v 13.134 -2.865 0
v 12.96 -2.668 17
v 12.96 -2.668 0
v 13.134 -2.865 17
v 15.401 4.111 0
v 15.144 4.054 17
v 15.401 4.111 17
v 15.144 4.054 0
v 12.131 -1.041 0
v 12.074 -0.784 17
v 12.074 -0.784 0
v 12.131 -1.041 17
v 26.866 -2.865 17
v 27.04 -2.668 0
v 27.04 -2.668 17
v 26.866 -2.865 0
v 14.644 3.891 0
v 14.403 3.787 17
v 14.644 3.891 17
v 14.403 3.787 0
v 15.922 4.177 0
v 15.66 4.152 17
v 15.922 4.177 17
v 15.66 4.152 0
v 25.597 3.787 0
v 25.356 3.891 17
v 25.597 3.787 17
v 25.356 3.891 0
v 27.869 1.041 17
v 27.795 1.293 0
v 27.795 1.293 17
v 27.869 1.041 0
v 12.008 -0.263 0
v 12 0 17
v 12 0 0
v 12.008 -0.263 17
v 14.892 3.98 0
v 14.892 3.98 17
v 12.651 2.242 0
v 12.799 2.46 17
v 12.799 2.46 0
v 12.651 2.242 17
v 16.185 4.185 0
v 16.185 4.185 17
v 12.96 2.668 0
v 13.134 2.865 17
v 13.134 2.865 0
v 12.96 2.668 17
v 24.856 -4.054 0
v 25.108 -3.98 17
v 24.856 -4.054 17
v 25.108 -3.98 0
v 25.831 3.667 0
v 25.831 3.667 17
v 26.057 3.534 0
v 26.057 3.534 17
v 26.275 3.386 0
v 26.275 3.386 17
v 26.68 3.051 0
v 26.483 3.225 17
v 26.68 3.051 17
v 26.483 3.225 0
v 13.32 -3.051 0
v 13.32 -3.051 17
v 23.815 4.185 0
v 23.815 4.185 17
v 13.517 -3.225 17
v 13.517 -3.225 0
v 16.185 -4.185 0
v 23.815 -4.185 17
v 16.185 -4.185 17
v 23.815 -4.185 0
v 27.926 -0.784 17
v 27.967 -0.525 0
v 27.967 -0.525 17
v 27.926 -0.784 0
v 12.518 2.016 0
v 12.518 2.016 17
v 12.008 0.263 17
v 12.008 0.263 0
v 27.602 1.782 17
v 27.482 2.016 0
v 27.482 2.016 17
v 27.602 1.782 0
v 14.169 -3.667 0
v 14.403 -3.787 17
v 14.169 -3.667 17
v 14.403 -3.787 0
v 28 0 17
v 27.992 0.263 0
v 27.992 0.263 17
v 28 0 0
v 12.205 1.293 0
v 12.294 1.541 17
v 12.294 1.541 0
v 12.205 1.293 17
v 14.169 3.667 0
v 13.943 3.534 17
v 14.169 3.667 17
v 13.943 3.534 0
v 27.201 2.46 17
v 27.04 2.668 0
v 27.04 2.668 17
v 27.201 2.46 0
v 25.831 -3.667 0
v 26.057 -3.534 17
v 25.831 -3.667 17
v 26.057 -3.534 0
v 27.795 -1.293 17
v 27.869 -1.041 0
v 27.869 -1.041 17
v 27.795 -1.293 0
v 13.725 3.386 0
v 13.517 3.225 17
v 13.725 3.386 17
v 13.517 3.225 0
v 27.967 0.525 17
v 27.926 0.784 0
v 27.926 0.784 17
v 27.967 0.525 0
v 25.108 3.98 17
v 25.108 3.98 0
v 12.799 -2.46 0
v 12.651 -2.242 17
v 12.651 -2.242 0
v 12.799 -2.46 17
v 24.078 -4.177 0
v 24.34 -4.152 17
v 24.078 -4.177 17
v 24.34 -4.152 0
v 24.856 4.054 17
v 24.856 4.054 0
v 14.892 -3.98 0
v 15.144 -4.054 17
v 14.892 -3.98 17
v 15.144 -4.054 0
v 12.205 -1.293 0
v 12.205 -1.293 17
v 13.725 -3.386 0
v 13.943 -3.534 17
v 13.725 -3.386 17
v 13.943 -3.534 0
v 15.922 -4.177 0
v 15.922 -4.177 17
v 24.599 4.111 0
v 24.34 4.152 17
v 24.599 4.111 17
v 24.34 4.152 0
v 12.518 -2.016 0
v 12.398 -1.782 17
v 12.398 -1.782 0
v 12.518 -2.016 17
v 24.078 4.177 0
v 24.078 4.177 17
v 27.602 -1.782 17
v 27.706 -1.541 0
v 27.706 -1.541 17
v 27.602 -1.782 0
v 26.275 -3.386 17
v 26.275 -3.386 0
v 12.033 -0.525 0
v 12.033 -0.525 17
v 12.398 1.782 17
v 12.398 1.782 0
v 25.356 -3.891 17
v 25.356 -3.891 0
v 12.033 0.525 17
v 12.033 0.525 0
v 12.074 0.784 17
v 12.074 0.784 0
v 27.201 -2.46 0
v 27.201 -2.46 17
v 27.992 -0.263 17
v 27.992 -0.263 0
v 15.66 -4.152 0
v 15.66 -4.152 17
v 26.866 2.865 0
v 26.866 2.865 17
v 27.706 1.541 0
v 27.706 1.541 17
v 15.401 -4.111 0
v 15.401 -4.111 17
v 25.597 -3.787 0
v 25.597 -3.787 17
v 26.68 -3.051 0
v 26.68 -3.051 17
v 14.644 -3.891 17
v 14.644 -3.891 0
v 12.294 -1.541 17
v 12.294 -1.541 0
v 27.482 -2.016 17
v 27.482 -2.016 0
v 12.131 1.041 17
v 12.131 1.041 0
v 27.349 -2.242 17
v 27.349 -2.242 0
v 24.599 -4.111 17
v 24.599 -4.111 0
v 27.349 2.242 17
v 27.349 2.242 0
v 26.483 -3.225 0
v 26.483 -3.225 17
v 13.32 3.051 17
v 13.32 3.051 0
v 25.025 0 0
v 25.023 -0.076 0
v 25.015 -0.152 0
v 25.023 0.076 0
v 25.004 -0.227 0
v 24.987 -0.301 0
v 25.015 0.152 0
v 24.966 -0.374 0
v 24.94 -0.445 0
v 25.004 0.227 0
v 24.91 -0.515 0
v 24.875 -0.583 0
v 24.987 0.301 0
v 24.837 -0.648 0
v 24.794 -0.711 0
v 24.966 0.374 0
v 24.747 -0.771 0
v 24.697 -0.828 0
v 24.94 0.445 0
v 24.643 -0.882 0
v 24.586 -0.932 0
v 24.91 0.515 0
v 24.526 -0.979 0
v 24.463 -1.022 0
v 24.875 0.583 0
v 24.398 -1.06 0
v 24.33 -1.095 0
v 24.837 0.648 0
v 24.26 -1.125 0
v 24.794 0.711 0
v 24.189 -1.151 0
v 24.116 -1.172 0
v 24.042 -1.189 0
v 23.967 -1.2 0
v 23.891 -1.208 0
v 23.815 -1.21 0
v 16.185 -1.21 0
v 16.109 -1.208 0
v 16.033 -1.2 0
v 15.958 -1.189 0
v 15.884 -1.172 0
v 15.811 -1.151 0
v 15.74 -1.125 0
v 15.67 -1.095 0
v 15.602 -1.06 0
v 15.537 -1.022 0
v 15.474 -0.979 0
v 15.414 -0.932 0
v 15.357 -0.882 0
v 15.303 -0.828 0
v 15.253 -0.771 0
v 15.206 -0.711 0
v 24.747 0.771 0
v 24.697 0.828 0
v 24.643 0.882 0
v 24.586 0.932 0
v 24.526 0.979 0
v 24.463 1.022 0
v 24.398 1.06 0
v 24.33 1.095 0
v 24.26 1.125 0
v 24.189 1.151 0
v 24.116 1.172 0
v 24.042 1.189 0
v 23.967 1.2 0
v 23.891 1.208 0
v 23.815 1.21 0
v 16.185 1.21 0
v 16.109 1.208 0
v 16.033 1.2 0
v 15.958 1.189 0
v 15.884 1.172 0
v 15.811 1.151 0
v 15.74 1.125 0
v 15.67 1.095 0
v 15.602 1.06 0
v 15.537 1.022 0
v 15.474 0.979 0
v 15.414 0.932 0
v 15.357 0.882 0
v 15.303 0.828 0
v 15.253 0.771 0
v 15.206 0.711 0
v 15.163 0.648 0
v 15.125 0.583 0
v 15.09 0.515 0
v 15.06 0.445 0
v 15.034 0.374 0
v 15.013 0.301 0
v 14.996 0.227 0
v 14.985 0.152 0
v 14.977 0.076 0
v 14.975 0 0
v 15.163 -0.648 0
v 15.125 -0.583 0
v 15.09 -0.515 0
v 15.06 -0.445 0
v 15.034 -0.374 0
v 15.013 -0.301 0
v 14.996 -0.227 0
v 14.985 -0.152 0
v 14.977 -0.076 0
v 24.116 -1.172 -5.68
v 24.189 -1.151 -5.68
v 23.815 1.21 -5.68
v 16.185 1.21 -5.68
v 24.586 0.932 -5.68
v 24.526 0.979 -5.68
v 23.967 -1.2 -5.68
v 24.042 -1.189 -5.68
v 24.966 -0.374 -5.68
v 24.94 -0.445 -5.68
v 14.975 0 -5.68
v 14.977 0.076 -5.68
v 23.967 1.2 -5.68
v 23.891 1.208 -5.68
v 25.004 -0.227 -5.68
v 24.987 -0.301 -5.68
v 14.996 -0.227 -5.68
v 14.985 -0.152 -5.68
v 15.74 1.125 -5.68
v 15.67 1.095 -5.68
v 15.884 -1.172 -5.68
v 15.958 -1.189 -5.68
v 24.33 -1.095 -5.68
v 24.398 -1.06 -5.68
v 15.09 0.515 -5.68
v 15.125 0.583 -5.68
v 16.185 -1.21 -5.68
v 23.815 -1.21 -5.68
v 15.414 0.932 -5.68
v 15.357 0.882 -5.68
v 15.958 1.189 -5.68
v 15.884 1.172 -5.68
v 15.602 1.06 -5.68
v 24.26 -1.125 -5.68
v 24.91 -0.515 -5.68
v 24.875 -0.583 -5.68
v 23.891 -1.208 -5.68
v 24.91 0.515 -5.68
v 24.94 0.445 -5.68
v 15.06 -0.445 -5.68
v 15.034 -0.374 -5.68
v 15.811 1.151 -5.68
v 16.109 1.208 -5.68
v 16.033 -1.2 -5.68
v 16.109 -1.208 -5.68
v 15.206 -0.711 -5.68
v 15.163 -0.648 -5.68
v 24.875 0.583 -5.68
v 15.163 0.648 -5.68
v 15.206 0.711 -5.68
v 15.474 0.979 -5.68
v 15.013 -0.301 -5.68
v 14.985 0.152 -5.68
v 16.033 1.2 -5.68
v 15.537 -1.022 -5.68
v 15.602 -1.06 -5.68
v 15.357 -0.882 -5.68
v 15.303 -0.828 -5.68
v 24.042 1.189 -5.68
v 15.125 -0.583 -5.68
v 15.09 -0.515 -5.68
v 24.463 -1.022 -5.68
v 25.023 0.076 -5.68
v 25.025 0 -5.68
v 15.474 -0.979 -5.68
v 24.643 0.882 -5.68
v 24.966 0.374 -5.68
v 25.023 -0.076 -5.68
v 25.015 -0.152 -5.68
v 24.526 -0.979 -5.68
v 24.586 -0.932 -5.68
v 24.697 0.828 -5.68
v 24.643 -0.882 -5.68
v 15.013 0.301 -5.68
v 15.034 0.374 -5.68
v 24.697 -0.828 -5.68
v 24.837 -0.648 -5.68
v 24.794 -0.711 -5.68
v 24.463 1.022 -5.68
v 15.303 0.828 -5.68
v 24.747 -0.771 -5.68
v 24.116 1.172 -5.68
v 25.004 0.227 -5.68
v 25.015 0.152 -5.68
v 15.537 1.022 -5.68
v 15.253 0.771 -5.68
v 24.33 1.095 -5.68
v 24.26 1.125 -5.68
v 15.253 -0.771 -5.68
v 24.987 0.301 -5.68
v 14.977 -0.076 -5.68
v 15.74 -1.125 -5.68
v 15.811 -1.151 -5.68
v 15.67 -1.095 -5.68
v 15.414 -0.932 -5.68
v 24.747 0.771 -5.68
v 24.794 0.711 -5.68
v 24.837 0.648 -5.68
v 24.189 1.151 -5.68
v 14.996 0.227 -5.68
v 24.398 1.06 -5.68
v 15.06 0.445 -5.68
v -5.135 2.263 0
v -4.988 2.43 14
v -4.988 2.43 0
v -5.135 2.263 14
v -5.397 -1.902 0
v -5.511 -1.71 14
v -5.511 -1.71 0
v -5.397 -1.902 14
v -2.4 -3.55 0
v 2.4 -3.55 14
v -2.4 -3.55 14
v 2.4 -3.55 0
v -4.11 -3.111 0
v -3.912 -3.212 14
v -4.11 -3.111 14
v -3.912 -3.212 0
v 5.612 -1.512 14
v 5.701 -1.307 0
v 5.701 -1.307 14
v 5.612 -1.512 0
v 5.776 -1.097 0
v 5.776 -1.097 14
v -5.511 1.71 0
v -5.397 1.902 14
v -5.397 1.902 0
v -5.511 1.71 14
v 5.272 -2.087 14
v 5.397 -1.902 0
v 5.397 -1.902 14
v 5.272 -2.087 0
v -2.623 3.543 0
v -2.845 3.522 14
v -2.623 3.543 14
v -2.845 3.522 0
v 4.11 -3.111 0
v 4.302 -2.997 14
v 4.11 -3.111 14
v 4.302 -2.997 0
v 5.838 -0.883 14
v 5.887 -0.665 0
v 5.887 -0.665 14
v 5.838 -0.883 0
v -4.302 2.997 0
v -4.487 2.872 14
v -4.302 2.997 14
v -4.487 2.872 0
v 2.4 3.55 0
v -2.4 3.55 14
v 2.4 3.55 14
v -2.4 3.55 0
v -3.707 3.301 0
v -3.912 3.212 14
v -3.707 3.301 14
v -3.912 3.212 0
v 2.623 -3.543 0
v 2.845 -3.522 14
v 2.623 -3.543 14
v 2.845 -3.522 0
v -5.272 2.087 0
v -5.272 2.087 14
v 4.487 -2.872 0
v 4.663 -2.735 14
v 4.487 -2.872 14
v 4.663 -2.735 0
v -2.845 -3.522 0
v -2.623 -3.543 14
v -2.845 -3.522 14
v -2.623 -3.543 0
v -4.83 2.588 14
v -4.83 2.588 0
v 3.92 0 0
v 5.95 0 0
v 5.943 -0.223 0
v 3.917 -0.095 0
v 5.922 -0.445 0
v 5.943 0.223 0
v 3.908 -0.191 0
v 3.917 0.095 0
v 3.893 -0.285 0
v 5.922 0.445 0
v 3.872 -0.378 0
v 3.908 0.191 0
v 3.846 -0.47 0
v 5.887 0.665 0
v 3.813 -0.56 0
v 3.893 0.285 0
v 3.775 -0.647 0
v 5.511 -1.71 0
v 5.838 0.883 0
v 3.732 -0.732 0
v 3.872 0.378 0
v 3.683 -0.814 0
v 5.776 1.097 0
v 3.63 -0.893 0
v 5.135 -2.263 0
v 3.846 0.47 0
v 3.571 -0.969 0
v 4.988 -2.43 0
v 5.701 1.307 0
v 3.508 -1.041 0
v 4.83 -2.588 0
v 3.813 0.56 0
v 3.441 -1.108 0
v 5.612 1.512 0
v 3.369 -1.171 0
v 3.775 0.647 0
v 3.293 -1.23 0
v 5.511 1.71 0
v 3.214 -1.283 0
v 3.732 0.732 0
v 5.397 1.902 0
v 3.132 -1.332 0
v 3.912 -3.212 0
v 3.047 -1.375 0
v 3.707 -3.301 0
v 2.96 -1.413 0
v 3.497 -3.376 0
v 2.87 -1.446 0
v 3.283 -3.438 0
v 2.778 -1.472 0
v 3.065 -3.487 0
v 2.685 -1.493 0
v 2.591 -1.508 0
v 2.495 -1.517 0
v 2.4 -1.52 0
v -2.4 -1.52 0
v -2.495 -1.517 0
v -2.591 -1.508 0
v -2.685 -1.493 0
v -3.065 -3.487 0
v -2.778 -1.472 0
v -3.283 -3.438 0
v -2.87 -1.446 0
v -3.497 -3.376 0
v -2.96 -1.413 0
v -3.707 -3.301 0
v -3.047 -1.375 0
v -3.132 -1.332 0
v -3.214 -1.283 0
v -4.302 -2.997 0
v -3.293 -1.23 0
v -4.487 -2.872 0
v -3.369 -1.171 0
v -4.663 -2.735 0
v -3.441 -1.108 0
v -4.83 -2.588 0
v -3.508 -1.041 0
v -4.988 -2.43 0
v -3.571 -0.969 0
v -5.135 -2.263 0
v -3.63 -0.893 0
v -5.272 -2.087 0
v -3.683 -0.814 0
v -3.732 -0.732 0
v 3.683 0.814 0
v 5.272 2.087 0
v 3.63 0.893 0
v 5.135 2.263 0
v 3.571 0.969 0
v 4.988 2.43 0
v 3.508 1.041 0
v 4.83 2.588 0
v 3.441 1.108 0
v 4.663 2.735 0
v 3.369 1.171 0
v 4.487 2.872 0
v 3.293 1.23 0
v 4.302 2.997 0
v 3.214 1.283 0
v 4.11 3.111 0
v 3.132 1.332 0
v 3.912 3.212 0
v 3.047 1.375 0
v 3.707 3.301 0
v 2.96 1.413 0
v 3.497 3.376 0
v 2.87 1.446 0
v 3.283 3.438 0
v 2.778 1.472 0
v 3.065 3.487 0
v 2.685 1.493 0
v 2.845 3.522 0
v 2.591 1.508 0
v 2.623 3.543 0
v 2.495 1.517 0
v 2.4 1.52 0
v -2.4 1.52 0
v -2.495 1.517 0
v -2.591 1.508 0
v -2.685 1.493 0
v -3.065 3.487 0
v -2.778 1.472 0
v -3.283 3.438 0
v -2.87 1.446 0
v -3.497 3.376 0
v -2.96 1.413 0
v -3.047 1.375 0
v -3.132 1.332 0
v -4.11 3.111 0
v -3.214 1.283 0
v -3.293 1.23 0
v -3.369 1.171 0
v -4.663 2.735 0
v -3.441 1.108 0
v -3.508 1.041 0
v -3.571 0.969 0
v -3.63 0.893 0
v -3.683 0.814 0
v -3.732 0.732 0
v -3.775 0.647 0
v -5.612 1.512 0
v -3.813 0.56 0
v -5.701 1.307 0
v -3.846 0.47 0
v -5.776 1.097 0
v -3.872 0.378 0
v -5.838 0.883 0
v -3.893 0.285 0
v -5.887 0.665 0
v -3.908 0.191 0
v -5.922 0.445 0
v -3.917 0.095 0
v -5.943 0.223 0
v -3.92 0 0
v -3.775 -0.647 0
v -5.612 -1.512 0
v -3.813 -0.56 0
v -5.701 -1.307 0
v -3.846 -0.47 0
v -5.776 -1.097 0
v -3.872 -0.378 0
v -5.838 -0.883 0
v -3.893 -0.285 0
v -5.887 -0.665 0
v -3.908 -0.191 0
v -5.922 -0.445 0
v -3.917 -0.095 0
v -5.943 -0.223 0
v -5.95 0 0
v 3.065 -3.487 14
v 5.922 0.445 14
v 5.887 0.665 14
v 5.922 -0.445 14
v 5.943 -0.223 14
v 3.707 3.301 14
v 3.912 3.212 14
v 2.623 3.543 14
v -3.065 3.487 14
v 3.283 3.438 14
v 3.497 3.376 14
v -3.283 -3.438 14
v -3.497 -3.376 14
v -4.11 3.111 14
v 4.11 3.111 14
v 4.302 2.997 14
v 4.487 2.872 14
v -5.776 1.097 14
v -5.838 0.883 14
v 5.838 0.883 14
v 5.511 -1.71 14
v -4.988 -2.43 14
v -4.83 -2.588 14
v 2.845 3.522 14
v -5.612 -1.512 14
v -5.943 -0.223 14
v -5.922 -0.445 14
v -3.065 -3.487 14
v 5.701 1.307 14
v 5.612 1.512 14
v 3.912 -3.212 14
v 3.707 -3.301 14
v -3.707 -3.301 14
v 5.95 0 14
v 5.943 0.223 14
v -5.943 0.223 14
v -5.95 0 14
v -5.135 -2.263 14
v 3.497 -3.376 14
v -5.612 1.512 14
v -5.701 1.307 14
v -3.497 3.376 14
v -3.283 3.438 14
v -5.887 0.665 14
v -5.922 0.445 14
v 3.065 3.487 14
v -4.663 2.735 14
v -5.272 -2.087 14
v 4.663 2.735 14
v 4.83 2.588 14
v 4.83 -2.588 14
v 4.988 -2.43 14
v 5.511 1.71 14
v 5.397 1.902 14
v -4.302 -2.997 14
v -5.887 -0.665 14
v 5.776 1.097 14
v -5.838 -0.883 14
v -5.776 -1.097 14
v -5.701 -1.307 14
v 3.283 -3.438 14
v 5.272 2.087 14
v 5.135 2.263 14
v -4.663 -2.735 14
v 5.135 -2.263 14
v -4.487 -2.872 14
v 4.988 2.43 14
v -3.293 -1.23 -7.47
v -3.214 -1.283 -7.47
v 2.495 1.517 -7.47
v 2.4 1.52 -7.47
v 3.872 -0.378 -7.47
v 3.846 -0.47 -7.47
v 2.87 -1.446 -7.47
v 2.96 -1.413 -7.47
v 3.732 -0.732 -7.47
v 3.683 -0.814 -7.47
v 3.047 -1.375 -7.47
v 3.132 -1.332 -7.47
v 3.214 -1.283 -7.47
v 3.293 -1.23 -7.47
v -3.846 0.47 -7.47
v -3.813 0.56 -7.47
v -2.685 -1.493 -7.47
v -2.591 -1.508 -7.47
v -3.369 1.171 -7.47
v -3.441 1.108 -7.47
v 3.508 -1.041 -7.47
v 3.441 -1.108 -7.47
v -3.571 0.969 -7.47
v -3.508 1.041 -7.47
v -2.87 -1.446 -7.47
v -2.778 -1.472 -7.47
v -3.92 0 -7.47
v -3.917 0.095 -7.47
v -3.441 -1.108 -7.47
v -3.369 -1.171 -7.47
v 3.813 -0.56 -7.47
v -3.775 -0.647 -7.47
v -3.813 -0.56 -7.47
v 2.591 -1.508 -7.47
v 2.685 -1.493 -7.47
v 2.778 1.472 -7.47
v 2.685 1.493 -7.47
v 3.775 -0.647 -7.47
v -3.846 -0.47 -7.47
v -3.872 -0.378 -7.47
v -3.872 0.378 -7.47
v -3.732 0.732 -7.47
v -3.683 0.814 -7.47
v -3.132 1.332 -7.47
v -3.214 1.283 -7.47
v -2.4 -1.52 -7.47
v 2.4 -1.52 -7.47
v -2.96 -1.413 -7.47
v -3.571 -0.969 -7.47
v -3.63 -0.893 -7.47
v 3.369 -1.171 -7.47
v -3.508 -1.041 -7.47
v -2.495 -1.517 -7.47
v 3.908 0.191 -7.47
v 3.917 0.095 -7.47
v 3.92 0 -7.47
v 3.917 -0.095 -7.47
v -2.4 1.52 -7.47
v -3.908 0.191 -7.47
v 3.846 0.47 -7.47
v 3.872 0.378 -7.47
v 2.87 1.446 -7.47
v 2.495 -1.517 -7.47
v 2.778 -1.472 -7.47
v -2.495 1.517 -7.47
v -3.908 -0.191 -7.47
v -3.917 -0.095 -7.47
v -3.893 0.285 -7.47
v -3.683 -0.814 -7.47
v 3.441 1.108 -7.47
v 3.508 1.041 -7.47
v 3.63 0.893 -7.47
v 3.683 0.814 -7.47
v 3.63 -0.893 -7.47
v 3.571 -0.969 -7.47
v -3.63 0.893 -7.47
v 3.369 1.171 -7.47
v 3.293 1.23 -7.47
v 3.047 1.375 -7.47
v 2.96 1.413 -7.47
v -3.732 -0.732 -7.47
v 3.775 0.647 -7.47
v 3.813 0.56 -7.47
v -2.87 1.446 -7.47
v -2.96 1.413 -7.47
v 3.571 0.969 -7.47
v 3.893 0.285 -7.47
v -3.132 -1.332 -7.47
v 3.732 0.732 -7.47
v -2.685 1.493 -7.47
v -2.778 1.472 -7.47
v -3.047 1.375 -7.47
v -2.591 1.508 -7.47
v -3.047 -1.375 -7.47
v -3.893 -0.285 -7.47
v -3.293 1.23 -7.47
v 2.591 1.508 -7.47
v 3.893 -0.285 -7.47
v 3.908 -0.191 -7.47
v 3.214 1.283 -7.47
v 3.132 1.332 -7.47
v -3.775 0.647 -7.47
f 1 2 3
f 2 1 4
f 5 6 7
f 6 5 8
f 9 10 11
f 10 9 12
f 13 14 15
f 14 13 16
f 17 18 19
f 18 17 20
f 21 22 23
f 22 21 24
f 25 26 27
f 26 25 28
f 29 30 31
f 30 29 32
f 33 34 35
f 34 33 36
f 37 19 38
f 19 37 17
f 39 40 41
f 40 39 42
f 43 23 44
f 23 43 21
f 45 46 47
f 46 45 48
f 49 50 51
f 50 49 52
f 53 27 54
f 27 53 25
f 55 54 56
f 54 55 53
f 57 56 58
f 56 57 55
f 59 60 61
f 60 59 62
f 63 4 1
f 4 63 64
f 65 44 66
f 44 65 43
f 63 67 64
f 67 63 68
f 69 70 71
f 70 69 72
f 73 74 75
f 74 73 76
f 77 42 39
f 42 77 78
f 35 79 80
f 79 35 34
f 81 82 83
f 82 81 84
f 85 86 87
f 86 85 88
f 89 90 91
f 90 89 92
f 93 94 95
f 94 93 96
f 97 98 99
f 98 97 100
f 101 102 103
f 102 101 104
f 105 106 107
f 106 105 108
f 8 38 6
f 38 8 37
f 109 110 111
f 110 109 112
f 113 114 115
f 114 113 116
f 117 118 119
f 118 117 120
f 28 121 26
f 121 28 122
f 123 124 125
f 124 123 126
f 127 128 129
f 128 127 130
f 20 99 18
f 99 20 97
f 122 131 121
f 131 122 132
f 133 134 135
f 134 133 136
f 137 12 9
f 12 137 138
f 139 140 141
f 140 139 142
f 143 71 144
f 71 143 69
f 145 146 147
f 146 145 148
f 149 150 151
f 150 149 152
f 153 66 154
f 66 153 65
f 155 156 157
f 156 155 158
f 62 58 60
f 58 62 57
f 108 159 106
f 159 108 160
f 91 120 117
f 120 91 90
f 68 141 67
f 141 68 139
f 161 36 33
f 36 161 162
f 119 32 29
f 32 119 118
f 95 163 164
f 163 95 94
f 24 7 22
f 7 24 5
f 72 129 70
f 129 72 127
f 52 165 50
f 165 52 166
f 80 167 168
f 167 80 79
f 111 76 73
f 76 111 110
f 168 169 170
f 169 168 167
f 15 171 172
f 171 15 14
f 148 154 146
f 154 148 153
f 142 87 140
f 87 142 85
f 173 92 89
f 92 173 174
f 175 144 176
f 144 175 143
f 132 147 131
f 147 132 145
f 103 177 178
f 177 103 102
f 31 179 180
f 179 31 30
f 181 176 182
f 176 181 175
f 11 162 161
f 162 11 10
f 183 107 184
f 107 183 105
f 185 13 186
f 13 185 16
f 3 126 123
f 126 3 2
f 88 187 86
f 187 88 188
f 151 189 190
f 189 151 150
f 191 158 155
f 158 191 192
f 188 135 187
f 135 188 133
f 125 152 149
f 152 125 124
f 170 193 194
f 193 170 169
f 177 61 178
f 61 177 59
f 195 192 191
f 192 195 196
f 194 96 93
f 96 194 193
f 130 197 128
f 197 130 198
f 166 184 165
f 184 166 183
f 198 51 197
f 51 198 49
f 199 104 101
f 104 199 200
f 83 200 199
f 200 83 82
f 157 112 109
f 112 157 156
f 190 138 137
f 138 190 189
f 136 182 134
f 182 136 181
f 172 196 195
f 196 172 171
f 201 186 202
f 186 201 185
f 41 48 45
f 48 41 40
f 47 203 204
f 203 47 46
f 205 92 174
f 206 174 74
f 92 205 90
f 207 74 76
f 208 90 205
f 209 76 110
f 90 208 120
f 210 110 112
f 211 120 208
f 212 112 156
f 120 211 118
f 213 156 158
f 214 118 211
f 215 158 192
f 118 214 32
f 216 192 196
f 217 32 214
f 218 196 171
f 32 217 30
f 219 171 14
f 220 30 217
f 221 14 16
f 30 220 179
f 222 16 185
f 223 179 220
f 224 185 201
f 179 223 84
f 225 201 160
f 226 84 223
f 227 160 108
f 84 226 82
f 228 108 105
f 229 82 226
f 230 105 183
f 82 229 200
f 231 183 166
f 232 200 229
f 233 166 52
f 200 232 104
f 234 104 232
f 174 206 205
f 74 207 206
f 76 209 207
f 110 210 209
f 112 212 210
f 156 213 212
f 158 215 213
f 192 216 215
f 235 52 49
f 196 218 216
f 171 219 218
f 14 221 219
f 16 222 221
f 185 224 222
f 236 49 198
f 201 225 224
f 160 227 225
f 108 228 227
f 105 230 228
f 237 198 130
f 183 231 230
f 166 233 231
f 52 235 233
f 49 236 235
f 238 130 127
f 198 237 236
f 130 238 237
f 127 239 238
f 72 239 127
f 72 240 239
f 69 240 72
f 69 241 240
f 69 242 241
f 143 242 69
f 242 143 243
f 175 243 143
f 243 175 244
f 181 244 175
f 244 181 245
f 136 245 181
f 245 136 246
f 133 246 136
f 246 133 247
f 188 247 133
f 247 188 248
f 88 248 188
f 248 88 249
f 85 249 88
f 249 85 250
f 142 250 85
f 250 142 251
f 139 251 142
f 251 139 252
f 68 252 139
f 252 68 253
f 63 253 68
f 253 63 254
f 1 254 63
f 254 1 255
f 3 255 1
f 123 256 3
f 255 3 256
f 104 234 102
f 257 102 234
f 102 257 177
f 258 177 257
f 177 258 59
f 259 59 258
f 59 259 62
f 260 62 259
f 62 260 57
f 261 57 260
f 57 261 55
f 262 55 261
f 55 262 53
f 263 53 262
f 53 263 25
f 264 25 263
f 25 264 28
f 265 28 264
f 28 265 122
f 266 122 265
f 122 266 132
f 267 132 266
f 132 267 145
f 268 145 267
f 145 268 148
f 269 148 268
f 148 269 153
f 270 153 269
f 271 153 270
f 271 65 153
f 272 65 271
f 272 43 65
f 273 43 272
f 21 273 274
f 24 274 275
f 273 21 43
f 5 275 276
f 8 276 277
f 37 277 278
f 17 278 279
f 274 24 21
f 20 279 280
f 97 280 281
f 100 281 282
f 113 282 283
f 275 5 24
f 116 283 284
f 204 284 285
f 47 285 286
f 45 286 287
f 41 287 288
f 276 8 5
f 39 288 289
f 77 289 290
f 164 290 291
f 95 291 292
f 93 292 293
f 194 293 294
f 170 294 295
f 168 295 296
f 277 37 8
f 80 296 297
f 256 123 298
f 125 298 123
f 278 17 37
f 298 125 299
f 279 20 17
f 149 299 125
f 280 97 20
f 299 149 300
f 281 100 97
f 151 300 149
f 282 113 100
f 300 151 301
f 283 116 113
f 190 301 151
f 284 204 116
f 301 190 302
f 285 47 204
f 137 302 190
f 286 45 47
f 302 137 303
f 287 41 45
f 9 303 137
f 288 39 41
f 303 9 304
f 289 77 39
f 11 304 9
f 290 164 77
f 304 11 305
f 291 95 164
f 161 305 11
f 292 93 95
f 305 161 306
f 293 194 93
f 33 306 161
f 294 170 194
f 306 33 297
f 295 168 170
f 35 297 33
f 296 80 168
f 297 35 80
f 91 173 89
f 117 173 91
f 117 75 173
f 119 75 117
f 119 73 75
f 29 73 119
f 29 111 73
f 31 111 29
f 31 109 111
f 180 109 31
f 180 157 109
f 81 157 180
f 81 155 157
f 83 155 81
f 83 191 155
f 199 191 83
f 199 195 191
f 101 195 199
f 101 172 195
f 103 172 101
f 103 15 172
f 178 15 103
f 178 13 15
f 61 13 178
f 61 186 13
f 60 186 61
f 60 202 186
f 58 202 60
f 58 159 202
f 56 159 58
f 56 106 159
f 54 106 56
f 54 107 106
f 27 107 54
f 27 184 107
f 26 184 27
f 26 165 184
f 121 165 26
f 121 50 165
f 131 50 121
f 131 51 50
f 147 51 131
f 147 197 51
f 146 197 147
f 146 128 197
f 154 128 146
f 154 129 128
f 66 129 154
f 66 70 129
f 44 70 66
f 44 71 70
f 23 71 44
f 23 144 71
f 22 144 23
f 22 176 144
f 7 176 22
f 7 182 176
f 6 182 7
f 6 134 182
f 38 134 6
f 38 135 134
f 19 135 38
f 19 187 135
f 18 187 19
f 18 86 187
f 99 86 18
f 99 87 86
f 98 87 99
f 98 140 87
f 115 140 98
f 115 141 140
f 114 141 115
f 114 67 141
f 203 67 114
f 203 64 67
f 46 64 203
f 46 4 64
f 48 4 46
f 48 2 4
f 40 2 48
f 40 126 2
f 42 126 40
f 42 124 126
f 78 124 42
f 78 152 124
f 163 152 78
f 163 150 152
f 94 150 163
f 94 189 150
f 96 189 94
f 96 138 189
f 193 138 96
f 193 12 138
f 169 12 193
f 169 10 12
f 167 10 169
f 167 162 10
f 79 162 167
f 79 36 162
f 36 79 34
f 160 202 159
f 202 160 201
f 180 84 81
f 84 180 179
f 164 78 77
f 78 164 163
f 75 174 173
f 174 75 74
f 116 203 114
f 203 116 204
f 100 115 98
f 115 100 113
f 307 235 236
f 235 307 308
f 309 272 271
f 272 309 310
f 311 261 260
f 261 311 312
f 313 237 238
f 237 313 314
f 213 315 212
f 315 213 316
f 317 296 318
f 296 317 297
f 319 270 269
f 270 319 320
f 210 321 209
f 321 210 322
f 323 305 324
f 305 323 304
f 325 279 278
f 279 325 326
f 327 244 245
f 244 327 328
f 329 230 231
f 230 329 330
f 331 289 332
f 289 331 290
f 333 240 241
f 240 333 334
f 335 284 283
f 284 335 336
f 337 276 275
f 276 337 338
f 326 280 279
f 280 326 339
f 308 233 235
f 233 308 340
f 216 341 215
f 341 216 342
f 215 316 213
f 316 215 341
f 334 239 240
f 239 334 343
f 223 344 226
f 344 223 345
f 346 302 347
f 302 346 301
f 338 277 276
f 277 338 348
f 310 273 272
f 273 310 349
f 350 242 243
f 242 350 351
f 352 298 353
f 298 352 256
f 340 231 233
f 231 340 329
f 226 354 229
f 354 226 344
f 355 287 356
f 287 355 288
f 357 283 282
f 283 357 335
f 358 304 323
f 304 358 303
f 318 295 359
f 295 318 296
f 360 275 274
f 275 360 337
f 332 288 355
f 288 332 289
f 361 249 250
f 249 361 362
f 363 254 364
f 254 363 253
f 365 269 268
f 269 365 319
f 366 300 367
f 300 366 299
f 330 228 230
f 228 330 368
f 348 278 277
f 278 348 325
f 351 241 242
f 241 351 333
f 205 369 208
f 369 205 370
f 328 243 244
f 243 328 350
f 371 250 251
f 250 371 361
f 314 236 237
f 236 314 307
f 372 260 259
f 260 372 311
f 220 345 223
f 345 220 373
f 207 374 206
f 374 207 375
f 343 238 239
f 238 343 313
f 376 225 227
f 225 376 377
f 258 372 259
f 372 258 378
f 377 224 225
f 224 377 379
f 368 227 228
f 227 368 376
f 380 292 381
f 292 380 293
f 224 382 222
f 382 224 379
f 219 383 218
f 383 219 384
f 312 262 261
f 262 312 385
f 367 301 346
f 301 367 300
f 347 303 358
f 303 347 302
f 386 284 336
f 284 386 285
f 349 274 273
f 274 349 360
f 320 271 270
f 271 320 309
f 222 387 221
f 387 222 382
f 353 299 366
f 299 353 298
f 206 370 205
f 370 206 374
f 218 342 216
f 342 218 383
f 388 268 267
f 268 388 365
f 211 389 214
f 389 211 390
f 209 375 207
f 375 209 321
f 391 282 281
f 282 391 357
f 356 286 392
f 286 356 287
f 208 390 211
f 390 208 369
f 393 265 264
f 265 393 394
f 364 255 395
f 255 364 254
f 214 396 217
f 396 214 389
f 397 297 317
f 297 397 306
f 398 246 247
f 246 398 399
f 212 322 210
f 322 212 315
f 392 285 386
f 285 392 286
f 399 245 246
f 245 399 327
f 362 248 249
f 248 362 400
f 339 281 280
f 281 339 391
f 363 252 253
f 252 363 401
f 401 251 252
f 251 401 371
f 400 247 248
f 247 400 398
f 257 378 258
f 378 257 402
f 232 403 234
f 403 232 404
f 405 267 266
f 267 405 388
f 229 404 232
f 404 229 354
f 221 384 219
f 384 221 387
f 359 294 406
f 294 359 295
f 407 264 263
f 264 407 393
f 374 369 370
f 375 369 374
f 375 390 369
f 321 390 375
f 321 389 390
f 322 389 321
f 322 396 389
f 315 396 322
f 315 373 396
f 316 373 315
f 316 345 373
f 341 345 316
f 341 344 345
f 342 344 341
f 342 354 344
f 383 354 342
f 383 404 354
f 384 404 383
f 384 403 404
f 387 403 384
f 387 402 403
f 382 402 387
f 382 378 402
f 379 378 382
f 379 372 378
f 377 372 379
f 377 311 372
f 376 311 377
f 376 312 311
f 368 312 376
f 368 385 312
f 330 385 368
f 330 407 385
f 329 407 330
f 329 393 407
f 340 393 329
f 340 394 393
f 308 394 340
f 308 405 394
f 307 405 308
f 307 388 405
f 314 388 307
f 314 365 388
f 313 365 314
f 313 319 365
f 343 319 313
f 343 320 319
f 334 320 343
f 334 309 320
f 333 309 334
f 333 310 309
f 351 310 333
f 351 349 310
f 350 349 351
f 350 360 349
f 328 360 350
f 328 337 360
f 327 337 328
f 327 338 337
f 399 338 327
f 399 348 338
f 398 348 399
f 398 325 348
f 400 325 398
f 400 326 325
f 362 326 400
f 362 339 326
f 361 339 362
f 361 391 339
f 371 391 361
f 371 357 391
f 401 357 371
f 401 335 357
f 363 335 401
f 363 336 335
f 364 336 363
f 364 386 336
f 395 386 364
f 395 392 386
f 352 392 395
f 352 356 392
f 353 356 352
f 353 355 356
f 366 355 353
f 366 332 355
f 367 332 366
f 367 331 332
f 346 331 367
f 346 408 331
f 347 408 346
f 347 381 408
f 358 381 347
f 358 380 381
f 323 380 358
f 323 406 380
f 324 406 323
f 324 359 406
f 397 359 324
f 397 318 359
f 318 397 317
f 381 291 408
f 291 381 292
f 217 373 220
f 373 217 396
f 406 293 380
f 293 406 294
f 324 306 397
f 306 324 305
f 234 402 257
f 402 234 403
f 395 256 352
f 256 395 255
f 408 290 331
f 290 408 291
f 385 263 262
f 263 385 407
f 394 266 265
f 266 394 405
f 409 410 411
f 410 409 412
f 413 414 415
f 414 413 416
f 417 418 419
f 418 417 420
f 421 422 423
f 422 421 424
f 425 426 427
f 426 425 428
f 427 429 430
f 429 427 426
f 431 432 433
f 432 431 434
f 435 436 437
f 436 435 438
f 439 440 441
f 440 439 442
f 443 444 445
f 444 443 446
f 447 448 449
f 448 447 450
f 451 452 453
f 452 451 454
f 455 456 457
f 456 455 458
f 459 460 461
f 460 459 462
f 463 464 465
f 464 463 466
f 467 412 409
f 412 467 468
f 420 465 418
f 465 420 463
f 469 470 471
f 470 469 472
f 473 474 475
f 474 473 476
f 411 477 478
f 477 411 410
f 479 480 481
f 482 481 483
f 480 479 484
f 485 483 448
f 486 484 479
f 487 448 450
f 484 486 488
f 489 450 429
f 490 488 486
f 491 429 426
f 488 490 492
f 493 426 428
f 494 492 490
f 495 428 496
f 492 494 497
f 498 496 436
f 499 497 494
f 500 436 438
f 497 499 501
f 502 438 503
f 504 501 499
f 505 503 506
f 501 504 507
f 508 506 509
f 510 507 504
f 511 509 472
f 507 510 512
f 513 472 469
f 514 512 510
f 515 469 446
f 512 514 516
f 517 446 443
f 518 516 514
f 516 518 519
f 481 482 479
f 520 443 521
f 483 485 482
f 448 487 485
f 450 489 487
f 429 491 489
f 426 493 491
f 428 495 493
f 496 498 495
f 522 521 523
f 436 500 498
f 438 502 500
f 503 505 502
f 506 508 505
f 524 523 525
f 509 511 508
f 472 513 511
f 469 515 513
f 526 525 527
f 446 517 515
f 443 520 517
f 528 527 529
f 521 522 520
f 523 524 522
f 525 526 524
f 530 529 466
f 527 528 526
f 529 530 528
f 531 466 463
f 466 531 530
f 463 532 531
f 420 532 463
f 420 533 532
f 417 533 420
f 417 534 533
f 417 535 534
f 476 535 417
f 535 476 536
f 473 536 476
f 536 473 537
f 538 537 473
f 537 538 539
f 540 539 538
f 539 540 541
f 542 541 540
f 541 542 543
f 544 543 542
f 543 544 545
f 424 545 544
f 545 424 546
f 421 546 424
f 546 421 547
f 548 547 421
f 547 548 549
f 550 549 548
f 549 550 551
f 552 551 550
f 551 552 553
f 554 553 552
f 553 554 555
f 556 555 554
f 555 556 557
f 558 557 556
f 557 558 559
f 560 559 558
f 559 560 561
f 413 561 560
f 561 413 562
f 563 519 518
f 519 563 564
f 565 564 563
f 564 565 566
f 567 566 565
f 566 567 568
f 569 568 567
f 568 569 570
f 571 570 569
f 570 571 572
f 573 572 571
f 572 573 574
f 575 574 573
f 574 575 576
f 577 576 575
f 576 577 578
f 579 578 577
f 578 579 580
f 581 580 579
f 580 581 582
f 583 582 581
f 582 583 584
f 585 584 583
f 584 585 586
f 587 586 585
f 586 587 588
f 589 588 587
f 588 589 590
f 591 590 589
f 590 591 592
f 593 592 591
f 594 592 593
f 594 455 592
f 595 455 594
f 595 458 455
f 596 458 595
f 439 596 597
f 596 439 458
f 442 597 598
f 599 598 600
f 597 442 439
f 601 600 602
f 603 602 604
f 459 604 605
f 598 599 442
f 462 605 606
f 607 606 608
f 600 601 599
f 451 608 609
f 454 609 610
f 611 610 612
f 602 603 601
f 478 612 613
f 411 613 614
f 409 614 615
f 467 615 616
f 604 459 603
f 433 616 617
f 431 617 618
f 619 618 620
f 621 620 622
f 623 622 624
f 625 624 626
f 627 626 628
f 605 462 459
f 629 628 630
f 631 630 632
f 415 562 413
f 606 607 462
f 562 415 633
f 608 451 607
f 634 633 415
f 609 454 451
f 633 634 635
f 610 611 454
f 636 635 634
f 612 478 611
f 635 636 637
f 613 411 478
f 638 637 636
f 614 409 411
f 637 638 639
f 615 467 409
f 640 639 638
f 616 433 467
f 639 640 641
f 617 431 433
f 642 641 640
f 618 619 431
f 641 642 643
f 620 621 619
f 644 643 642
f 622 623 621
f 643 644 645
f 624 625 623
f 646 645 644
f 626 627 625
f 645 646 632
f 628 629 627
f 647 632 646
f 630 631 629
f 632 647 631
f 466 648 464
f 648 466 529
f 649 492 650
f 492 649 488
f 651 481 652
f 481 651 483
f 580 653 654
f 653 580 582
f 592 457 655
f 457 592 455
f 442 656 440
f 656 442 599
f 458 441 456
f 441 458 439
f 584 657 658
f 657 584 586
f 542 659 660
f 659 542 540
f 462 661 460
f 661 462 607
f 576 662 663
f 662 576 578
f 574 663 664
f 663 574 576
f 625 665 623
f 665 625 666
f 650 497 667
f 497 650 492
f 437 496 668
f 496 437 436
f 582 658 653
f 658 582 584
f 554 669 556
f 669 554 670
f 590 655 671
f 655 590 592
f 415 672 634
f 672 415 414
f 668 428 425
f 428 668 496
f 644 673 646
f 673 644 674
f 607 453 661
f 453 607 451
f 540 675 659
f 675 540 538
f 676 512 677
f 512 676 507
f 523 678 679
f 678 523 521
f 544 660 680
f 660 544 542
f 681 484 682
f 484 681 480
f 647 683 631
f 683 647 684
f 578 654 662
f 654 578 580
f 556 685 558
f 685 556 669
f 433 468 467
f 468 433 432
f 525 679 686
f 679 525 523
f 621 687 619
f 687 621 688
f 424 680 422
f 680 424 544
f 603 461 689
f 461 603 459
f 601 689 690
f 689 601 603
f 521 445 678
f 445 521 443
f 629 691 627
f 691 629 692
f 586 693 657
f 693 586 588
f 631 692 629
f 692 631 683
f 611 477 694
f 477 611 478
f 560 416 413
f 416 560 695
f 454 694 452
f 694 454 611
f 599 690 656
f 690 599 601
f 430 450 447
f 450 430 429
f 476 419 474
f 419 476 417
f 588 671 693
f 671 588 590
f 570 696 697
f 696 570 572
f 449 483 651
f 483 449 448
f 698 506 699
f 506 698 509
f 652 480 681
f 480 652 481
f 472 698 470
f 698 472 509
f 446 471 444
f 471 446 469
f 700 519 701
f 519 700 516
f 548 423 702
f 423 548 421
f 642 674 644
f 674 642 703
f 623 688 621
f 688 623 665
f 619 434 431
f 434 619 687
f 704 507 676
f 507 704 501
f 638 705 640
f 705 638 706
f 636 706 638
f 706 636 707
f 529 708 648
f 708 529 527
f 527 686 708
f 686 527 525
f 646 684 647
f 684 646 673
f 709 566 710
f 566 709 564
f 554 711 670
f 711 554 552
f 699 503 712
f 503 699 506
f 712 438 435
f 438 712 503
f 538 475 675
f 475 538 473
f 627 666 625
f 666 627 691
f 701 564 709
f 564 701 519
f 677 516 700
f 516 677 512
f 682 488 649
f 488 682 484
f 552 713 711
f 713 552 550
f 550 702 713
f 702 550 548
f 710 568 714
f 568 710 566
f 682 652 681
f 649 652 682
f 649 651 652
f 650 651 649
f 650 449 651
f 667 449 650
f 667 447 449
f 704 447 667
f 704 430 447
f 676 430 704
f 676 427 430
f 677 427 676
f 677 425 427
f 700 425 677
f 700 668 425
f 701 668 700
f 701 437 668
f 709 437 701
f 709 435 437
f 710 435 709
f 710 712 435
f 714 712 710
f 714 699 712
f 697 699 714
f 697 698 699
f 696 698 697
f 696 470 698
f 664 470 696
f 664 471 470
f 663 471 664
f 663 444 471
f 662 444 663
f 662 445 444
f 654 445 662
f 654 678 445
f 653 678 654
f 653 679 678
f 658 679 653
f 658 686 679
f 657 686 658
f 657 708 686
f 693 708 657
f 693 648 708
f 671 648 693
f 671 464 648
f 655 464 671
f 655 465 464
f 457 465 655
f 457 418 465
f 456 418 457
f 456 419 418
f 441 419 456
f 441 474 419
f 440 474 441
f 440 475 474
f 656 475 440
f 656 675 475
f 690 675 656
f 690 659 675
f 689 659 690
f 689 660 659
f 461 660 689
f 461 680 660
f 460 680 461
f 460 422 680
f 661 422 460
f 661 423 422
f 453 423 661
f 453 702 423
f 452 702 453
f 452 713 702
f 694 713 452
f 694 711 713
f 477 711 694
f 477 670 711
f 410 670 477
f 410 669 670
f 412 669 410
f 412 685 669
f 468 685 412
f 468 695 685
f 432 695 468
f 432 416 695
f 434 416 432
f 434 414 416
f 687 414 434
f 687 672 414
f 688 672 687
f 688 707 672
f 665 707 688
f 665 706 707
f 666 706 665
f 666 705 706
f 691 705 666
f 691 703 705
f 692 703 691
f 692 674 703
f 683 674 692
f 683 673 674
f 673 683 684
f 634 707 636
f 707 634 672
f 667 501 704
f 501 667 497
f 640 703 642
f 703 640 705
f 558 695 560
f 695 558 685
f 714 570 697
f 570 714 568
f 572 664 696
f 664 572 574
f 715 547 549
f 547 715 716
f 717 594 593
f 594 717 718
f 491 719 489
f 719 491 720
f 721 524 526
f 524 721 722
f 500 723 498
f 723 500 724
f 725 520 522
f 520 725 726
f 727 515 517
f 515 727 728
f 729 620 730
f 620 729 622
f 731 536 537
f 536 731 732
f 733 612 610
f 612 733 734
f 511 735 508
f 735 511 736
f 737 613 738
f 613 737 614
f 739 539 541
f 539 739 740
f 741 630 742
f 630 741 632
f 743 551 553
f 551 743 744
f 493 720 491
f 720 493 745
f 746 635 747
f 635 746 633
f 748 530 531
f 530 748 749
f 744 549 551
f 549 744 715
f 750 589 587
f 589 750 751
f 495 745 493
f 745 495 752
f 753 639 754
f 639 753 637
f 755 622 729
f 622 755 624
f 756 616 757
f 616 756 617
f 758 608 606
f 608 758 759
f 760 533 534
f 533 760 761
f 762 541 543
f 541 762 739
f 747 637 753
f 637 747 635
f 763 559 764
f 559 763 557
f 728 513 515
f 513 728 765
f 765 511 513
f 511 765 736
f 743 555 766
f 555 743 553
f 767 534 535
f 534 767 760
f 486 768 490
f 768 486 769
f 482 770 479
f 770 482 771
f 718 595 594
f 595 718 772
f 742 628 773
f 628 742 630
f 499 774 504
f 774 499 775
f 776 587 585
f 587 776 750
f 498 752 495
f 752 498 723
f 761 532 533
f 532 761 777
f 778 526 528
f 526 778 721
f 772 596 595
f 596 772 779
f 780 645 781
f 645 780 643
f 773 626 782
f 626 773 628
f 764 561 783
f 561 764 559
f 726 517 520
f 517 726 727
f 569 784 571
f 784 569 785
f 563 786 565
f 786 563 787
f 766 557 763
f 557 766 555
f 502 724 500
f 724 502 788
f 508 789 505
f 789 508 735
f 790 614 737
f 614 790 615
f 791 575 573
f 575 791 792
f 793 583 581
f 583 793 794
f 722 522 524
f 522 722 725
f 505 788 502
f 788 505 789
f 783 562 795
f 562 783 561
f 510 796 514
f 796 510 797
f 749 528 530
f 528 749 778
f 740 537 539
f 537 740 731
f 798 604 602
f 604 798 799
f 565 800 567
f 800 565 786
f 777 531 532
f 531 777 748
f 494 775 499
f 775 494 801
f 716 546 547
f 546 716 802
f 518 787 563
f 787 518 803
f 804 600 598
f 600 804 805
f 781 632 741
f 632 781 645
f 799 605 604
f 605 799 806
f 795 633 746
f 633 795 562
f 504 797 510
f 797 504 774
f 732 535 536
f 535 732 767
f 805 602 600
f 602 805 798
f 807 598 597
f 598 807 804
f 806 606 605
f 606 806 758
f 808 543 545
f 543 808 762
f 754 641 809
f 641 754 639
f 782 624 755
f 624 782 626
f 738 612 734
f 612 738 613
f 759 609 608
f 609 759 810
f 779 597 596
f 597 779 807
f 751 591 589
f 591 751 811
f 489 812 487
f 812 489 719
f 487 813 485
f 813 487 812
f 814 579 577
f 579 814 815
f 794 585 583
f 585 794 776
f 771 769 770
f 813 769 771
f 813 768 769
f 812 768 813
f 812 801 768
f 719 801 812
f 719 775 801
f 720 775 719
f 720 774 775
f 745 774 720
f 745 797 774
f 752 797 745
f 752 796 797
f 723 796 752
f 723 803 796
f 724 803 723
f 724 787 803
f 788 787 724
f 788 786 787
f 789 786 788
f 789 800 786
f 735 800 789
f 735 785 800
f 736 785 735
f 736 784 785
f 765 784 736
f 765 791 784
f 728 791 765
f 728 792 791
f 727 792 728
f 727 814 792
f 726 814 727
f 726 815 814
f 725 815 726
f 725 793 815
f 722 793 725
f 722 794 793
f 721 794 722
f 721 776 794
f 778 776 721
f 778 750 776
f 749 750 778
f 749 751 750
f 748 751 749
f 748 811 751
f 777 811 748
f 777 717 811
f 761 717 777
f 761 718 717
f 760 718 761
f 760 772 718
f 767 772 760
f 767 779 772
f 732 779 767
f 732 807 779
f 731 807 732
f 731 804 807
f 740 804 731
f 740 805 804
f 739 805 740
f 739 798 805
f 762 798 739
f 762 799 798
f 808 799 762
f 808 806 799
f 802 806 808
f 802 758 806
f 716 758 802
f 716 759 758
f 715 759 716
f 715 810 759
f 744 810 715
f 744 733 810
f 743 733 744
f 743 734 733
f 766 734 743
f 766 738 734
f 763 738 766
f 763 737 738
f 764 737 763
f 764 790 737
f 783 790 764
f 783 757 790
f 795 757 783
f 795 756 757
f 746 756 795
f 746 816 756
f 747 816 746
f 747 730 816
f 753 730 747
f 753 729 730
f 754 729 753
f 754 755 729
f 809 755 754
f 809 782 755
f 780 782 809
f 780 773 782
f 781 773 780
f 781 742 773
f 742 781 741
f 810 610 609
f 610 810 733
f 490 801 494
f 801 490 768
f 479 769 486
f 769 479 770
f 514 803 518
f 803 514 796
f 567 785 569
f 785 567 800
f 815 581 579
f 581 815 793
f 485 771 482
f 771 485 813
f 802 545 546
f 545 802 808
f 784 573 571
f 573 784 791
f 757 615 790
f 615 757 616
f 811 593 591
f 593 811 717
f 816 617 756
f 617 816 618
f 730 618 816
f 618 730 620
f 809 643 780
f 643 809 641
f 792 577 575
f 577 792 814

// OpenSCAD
/* [Hidden] */

TWEAK = 1;

module USB_A()
{
     DIA = 7.37 + TWEAK;
     WIDTH = 15.0 + TWEAK;
     DIST = WIDTH - DIA;
     LENGTH = 17.0;
    
     color("YELLOW", .3)
     hull()
     {
         translate([ DIST /2, 0, 0 ])
         cylinder(h = LENGTH, d = DIA, $fn=100);
         
         translate([ -DIST /2, 0, 0 ])
         cylinder(h = LENGTH, d = DIA, $fn=100);
     }
     
     xDIA = 1.92 + TWEAK/2;
     xWIDTH = 7.0 + TWEAK/2;
     xDIST = WIDTH - DIA;
     xLENGTH = 5.68;

     rotate([180, 0, 0])
     #hull()
     {
         translate([ xDIST /2, 0, 0 ])
         cylinder(h = xLENGTH, d = xDIA, $fn=100);
         
         translate([ -xDIST /2, 0, 0 ])
         cylinder(h = xLENGTH, d = xDIA, $fn=100);
     }
}

module USB_C()
{
     DIA = 6.10 + TWEAK;
     WIDTH = 10.9 + TWEAK;
     DIST = WIDTH - DIA;
     LENGTH = 14.0;
    
     color("YELLOW", .3)
     hull()
     {
         translate([ DIST /2, 0, 0 ])
         cylinder(h = LENGTH, d = DIA, $fn=100);
         
         translate([ -DIST /2, 0, 0 ])
         cylinder(h = LENGTH, d = DIA, $fn=100);
     }
     
     xDIA = 2.54 + TWEAK/2;
     xWIDTH = 8.25 + TWEAK/2;
     xDIST = WIDTH - DIA;
     xLENGTH = 7.47;

     rotate([180, 0, 0])
     #hull()
     {
         translate([ xDIST /2, 0, 0 ])
         cylinder(h = xLENGTH, d = xDIA, $fn=100);
         
         translate([ -xDIST /2, 0, 0 ])
         cylinder(h = xLENGTH, d = xDIA, $fn=100);
     }
}

translate([20, 0, 0])
USB_A();



USB_C();
